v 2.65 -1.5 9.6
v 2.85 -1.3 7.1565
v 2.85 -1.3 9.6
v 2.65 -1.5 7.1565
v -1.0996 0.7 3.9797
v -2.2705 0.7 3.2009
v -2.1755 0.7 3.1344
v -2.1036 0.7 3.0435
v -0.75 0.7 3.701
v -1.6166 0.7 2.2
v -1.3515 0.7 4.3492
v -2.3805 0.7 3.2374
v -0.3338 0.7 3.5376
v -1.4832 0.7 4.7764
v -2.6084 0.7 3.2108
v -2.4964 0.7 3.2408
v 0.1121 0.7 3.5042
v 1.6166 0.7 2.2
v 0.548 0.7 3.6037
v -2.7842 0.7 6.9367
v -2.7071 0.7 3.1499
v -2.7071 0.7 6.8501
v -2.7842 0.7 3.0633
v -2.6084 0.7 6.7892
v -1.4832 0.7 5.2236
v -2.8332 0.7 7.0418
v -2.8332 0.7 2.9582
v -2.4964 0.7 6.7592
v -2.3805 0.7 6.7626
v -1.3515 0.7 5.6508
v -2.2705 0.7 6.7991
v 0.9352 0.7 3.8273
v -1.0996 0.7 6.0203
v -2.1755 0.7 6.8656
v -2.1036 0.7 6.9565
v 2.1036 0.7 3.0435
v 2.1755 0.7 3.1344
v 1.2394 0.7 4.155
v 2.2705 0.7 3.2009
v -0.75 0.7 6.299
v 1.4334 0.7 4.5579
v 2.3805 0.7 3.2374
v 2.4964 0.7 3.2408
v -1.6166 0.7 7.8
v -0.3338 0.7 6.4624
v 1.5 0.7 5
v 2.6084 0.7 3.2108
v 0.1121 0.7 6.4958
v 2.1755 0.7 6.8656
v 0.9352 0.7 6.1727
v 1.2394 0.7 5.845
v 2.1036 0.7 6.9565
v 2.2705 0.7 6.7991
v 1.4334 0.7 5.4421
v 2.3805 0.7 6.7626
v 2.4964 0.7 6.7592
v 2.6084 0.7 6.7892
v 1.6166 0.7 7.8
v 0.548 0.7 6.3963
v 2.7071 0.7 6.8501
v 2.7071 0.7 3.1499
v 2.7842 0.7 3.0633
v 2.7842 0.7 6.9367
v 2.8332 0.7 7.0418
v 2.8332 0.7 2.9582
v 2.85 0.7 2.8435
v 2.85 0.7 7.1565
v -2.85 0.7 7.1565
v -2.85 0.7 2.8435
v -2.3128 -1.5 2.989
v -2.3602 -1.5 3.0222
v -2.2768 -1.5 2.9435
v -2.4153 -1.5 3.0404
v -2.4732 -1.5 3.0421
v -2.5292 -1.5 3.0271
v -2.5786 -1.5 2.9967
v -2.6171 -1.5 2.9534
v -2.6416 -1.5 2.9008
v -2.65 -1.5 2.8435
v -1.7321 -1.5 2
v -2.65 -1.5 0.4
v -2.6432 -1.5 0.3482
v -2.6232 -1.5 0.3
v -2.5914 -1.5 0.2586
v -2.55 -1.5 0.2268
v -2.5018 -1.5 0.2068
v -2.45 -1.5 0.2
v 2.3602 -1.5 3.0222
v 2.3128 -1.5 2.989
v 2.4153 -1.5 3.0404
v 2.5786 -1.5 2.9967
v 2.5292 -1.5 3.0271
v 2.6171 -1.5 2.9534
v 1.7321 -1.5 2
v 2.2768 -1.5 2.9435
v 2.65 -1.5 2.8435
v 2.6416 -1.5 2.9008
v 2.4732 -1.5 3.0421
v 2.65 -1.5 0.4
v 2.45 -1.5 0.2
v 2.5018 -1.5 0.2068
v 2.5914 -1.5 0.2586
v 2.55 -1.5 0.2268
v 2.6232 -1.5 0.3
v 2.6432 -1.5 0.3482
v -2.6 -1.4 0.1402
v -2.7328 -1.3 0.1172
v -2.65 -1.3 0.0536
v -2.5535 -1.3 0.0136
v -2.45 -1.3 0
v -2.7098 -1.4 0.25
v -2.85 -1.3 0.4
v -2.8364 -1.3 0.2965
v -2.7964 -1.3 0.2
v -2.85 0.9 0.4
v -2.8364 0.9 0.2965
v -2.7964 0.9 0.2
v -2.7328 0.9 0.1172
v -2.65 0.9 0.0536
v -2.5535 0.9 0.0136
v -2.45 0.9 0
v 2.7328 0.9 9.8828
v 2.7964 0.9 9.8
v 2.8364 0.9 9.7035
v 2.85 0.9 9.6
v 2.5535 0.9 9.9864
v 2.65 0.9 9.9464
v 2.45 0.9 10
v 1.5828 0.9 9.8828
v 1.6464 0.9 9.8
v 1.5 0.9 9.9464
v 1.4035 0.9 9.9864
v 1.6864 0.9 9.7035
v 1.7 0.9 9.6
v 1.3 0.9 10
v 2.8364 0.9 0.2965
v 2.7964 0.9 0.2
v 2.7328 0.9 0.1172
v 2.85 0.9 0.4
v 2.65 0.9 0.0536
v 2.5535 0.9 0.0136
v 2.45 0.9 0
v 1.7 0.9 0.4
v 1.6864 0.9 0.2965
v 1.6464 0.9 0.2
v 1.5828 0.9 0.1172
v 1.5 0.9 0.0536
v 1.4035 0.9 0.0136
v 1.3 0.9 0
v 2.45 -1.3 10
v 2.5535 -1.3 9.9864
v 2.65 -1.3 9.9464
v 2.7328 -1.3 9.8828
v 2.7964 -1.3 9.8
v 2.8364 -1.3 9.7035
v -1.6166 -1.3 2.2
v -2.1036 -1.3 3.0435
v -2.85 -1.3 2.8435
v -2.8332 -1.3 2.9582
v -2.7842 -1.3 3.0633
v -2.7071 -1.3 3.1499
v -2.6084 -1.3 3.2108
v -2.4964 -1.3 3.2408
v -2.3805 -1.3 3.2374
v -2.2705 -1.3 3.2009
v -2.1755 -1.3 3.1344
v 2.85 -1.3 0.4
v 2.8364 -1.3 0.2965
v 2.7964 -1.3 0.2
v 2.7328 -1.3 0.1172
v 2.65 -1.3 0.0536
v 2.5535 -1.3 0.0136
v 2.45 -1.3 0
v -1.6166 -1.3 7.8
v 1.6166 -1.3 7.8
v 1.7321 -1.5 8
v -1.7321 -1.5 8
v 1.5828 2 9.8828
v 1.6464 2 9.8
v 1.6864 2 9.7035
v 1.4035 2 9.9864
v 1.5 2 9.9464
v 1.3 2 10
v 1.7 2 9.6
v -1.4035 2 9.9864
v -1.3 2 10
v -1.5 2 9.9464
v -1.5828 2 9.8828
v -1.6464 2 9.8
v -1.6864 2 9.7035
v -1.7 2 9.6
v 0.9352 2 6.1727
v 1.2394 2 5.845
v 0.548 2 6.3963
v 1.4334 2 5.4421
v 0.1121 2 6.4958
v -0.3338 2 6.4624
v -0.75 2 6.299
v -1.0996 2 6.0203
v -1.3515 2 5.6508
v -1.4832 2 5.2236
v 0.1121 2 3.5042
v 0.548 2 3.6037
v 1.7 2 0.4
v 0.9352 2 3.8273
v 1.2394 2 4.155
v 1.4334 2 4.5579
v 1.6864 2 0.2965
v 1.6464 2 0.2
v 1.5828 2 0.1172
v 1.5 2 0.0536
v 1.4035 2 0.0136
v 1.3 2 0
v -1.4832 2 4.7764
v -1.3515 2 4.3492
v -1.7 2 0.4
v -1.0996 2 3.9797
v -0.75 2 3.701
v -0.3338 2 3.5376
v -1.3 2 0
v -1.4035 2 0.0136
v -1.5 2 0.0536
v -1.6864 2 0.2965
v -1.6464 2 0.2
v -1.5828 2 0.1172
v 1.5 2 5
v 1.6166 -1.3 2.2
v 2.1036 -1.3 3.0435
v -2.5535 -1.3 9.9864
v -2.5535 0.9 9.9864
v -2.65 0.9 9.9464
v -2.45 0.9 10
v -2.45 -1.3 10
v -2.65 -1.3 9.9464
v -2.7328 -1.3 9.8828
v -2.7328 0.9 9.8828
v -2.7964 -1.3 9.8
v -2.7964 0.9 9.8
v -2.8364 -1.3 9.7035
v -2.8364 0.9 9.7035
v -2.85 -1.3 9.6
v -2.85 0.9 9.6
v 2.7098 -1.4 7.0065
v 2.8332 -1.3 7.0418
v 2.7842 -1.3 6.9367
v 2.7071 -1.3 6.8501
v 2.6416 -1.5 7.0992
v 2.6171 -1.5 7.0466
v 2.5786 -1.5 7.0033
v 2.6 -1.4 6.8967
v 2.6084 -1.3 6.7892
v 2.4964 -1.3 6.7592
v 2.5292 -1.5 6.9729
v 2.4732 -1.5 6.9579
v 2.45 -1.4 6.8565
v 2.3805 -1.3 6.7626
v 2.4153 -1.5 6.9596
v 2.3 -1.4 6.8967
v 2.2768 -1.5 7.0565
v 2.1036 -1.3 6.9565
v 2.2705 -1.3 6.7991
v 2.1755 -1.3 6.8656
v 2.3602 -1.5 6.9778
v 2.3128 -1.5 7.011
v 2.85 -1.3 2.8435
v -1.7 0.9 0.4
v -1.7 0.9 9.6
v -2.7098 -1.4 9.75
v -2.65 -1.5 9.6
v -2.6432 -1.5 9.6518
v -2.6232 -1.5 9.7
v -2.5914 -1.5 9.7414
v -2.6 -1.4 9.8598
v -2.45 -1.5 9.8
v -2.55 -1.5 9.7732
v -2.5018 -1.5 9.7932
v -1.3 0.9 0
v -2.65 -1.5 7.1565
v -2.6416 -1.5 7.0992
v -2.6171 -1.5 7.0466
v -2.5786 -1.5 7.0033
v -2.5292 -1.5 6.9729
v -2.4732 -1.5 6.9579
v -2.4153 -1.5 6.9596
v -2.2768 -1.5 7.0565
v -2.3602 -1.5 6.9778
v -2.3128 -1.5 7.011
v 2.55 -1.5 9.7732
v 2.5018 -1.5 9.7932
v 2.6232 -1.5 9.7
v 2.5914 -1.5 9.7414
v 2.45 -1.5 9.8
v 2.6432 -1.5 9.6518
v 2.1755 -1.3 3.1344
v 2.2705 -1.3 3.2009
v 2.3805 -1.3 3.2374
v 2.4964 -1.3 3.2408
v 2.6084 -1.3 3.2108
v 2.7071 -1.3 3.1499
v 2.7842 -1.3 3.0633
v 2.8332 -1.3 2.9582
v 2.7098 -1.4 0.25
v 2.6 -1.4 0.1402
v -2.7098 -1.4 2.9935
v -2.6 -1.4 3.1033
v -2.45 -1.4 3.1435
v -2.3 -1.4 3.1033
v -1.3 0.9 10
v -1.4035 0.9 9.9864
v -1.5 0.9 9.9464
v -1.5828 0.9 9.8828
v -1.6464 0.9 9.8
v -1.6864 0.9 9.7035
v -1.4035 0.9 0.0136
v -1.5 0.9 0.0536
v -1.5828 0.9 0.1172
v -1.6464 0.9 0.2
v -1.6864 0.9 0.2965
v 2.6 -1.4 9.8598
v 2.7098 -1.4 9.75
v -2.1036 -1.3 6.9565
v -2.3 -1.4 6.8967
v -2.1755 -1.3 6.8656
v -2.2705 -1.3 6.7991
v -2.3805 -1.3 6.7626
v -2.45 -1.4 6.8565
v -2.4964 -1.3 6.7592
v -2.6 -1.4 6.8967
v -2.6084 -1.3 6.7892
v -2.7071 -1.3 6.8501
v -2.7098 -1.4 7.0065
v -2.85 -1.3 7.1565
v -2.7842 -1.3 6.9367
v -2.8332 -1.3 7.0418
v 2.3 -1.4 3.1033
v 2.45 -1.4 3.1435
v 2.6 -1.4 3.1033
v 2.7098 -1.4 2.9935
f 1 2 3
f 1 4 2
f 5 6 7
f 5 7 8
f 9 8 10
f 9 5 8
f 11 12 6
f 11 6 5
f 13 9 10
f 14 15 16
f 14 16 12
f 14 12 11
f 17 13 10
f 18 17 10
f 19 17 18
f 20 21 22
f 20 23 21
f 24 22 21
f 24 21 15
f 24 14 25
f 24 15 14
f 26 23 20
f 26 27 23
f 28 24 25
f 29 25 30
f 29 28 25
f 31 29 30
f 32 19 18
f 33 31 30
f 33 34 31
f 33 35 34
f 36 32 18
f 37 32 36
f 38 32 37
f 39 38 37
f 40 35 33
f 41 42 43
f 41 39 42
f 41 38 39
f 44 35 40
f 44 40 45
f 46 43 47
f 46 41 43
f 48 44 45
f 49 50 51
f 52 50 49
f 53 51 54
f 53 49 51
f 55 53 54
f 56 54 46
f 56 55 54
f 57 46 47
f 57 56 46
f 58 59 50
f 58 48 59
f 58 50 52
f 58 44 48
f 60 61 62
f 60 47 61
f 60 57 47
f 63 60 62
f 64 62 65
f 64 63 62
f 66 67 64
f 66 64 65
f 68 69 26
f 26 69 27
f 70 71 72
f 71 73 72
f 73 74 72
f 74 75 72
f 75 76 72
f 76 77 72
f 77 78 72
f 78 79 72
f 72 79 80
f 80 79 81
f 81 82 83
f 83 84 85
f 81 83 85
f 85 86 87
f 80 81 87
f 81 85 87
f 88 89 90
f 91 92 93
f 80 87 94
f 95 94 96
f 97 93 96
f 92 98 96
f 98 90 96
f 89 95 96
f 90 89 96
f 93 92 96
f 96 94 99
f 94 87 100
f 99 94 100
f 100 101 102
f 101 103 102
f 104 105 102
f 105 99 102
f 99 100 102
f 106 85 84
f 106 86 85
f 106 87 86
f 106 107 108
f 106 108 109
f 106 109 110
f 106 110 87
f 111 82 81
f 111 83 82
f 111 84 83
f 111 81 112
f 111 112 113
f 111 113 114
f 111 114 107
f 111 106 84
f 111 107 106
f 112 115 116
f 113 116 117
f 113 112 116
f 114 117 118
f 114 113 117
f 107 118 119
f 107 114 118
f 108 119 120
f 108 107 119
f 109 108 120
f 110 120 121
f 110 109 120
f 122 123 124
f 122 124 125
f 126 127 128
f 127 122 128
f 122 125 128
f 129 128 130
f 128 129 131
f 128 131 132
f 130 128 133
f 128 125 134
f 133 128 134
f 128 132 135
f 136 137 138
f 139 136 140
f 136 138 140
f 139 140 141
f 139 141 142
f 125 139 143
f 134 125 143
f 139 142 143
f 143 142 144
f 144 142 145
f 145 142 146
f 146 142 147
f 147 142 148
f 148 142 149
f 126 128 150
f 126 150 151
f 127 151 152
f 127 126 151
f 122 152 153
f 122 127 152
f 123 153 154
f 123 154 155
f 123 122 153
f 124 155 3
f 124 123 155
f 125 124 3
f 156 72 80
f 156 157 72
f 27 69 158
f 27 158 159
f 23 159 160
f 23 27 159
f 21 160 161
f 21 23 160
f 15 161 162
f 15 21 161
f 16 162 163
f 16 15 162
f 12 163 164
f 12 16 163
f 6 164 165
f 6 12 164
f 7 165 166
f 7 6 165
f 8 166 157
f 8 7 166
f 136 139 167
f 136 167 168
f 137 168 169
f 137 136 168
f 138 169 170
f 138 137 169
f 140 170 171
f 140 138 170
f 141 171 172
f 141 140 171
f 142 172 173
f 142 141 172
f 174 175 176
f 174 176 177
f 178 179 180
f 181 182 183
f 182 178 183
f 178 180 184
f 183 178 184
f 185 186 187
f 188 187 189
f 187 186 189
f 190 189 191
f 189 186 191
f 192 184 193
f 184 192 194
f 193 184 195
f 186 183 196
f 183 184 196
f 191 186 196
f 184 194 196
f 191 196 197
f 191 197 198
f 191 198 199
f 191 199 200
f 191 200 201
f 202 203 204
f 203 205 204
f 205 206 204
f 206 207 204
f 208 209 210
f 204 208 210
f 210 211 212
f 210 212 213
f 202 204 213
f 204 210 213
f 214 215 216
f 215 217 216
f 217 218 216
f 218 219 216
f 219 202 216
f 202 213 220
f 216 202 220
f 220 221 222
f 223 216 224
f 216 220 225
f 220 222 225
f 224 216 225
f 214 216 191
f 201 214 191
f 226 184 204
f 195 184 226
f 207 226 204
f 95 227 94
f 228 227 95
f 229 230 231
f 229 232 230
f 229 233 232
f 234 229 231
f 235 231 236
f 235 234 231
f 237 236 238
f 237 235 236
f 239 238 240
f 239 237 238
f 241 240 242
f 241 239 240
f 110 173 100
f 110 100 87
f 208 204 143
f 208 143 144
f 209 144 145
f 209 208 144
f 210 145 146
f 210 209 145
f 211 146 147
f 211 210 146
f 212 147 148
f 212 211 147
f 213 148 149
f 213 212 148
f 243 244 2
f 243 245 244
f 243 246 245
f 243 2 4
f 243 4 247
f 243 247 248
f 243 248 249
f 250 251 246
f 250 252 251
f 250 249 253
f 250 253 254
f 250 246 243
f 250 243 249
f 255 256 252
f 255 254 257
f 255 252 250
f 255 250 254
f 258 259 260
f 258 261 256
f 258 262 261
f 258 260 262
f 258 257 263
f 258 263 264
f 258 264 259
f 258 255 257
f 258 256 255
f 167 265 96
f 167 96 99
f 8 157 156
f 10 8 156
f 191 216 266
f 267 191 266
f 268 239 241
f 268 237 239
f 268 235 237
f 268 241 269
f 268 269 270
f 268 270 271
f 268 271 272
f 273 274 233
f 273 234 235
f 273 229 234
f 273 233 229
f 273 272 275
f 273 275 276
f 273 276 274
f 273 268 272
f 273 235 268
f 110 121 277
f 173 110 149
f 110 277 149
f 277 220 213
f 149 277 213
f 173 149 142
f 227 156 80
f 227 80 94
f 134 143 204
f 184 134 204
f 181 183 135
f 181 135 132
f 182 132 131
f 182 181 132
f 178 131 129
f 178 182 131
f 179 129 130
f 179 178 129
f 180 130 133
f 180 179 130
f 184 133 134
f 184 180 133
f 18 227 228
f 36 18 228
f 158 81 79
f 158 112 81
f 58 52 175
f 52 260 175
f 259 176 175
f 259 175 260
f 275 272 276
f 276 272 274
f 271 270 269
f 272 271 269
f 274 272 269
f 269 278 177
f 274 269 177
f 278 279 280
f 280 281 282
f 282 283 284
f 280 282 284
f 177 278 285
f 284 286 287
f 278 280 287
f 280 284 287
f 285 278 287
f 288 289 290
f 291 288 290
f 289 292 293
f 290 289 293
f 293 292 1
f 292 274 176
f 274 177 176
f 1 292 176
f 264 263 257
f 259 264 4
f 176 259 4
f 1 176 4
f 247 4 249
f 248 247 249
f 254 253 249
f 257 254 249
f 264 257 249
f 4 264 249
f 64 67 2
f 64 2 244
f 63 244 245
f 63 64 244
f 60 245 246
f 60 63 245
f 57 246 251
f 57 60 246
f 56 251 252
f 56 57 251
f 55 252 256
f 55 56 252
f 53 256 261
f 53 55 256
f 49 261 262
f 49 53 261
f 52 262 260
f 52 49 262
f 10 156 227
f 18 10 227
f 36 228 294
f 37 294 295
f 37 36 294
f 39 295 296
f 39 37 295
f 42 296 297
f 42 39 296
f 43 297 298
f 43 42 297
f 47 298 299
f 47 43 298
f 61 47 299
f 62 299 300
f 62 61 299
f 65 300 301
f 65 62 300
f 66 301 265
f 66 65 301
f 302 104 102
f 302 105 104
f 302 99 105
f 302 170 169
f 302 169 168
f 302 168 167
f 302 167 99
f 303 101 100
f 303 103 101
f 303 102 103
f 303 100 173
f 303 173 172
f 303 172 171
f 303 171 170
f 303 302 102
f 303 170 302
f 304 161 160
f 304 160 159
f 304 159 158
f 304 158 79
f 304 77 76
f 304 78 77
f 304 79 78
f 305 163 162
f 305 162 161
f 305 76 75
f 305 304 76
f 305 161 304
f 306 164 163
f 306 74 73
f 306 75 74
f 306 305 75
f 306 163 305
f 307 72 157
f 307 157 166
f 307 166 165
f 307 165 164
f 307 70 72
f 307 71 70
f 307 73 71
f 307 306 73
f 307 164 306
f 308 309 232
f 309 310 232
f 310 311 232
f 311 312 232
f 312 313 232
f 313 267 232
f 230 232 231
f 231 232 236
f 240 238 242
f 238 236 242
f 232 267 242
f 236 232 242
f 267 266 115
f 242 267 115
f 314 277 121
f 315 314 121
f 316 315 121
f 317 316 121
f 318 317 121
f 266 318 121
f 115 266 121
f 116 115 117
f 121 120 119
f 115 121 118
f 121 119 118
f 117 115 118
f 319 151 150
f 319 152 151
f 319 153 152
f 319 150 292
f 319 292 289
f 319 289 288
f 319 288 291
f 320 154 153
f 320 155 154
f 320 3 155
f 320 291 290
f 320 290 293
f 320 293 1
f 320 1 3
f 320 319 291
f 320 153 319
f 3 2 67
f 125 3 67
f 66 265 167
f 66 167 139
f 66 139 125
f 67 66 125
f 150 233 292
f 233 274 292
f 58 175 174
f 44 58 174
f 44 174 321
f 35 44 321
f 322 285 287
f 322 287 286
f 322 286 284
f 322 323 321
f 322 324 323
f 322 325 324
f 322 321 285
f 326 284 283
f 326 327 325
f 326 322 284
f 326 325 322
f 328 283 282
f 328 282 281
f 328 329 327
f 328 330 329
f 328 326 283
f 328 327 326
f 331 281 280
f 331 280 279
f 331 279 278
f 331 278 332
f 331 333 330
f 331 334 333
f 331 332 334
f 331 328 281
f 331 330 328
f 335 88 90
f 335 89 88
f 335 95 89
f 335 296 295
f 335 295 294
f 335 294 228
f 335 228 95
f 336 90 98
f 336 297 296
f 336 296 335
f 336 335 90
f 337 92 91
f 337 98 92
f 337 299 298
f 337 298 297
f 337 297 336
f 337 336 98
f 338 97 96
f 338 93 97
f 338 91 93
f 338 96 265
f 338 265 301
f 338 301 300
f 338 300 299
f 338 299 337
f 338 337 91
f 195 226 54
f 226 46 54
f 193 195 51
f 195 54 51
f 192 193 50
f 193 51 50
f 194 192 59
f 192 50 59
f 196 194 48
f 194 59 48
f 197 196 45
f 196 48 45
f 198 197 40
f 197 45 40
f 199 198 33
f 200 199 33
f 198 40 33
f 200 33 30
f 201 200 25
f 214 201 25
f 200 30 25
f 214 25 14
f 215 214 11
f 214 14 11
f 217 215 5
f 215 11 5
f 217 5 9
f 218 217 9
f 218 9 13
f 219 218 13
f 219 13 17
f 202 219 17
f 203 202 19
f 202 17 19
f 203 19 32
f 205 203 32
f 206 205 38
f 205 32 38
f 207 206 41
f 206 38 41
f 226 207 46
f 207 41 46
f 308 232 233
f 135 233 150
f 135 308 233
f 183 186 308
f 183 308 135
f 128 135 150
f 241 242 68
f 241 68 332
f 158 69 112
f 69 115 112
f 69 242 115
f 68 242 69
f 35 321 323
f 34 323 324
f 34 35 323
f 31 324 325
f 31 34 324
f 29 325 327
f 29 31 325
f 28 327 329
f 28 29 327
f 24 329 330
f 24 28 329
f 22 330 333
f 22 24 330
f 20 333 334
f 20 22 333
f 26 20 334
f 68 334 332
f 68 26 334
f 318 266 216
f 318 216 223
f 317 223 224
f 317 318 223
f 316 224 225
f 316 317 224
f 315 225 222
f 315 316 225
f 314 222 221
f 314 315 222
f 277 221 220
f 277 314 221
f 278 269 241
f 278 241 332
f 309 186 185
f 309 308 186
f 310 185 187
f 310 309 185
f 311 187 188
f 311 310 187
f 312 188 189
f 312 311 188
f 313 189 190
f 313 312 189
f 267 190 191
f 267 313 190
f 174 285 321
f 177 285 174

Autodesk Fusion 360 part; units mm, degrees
sketch "Sketch1" plane through (0, 0, 0) normal (0, 0, 1) x (1, 0, 0)
  line L0 (-2.85, 0.9) -> (-2.85, -1.5)
  line L1 (2.85, -1.5) -> (2.85, 0.9)
  line L2 (2.85, 0.9) -> (1.7, 0.9)
  line L3 (1.7, 0.9) -> (1.7, 2)
  line L4 (1.7, 2) -> (-1.7, 2)
  line L5 (-1.7, 2) -> (-1.7, 0.9)
  line L6 (-1.7, 0.9) -> (-2.85, 0.9)
  line L7 (-2.85, -1.5) -> (2.85, -1.5)
  dimension "d1" = 3.4
  dimension "d2" = 5.7
  dimension "d3" = 2.4
  dimension "d4" = 1.1
  dimension "d5" = 1.7
  dimension "d6" = 2
  dimension "d7" = 1.15
extrude "Extrude1" add sketch "Sketch1" along normal blind 10
sketch "Sketch2" plane through (0, -1.5, 0) normal (0, -1, 0) x (1, 0, 0)
  line L0 (-2.85, 0) -> (2.85, 0)
  line L1 (2.85, 0) -> (2.85, 10)
  line L2 (2.85, 10) -> (-2.85, 10)
  line L3 (-2.85, 10) -> (-2.85, 0)
  line L4 (1.6166, 2.2) -> (3.2332, 5)
  line L5 (3.2332, 5) -> (1.6166, 7.8)
  line L6 (1.6166, 7.8) -> (-1.6166, 7.8)
  line L7 (-1.6166, 7.8) -> (-3.2332, 5)
  line L8 (-3.2332, 5) -> (-1.6166, 2.2)
  line L9 (-1.6166, 2.2) -> (1.6166, 2.2)
  circle A0 centre (0, 5) radius 1.5
  point P0 (0, 5)
  dimension "d10" = 2.8
  dimension "d11" = 2.85
  dimension "d19" = 5
  dimension "d20" = 3
extrude "Extrude2" cut sketch "Sketch2" against normal blind 2.2 contours L1 L3 L4 L5 L6 L7 L8 L9 | A0
fillet "Fillet1" radius 0.4 4 edges at (-2.85, -0.4, 4.3363) (2.85, -0.4, 5.6637) (2.85, -0.4, 4.3363) (-2.85, -0.4, 5.6637)
fillet "Fillet2" radius 0.4 8 edges at (-1.7, 1.45, 0) (-2.85, -0.3, 0) (-2.85, -0.3, 10) (-1.7, 1.45, 10) (1.7, 1.45, 0) (2.85, -0.3, 0) (1.7, 1.45, 10) (2.85, -0.3, 10)
chamfer "Chamfer1" distance 0.2 angle 45 20 edges at (0, -1.5, 0) (2.7328, -1.5, 0.1172) (2.85, -1.5, 1.6218) (2.5535, -1.5, 3.2299) (1.8601, -1.5, 2.6218) (-1.8601, -1.5, 2.6218) (-2.5535, -1.5, 3.2299) (-2.85, -1.5, 1.6218) (-2.7328, -1.5, 0.1172) (0, -1.5, 2.2) (-2.85, -1.5, 8.3782) (-2.7328, -1.5, 9.8828) (0, -1.5, 10) (2.7328, -1.5, 9.8828) (2.85, -1.5, 8.3782) (2.5535, -1.5, 6.7701) (1.8601, -1.5, 7.3782) (-1.8601, -1.5, 7.3782) (-2.5535, -1.5, 6.7701) (0, -1.5, 7.8)
extrude "Extrude3" cut sketch "Sketch2" against normal blind 5 contours A0
equation "d5 = ( 3.4 / 2 ) * 1 mm"
equation "d7 = ( ( 5.7 - 3.4 ) / 2 ) * 1 mm"
equation "d10 = ( 5.6 / 2 ) * 1 mm"
equation "d11 = ( 5.7 / 2 ) * 1 mm"
